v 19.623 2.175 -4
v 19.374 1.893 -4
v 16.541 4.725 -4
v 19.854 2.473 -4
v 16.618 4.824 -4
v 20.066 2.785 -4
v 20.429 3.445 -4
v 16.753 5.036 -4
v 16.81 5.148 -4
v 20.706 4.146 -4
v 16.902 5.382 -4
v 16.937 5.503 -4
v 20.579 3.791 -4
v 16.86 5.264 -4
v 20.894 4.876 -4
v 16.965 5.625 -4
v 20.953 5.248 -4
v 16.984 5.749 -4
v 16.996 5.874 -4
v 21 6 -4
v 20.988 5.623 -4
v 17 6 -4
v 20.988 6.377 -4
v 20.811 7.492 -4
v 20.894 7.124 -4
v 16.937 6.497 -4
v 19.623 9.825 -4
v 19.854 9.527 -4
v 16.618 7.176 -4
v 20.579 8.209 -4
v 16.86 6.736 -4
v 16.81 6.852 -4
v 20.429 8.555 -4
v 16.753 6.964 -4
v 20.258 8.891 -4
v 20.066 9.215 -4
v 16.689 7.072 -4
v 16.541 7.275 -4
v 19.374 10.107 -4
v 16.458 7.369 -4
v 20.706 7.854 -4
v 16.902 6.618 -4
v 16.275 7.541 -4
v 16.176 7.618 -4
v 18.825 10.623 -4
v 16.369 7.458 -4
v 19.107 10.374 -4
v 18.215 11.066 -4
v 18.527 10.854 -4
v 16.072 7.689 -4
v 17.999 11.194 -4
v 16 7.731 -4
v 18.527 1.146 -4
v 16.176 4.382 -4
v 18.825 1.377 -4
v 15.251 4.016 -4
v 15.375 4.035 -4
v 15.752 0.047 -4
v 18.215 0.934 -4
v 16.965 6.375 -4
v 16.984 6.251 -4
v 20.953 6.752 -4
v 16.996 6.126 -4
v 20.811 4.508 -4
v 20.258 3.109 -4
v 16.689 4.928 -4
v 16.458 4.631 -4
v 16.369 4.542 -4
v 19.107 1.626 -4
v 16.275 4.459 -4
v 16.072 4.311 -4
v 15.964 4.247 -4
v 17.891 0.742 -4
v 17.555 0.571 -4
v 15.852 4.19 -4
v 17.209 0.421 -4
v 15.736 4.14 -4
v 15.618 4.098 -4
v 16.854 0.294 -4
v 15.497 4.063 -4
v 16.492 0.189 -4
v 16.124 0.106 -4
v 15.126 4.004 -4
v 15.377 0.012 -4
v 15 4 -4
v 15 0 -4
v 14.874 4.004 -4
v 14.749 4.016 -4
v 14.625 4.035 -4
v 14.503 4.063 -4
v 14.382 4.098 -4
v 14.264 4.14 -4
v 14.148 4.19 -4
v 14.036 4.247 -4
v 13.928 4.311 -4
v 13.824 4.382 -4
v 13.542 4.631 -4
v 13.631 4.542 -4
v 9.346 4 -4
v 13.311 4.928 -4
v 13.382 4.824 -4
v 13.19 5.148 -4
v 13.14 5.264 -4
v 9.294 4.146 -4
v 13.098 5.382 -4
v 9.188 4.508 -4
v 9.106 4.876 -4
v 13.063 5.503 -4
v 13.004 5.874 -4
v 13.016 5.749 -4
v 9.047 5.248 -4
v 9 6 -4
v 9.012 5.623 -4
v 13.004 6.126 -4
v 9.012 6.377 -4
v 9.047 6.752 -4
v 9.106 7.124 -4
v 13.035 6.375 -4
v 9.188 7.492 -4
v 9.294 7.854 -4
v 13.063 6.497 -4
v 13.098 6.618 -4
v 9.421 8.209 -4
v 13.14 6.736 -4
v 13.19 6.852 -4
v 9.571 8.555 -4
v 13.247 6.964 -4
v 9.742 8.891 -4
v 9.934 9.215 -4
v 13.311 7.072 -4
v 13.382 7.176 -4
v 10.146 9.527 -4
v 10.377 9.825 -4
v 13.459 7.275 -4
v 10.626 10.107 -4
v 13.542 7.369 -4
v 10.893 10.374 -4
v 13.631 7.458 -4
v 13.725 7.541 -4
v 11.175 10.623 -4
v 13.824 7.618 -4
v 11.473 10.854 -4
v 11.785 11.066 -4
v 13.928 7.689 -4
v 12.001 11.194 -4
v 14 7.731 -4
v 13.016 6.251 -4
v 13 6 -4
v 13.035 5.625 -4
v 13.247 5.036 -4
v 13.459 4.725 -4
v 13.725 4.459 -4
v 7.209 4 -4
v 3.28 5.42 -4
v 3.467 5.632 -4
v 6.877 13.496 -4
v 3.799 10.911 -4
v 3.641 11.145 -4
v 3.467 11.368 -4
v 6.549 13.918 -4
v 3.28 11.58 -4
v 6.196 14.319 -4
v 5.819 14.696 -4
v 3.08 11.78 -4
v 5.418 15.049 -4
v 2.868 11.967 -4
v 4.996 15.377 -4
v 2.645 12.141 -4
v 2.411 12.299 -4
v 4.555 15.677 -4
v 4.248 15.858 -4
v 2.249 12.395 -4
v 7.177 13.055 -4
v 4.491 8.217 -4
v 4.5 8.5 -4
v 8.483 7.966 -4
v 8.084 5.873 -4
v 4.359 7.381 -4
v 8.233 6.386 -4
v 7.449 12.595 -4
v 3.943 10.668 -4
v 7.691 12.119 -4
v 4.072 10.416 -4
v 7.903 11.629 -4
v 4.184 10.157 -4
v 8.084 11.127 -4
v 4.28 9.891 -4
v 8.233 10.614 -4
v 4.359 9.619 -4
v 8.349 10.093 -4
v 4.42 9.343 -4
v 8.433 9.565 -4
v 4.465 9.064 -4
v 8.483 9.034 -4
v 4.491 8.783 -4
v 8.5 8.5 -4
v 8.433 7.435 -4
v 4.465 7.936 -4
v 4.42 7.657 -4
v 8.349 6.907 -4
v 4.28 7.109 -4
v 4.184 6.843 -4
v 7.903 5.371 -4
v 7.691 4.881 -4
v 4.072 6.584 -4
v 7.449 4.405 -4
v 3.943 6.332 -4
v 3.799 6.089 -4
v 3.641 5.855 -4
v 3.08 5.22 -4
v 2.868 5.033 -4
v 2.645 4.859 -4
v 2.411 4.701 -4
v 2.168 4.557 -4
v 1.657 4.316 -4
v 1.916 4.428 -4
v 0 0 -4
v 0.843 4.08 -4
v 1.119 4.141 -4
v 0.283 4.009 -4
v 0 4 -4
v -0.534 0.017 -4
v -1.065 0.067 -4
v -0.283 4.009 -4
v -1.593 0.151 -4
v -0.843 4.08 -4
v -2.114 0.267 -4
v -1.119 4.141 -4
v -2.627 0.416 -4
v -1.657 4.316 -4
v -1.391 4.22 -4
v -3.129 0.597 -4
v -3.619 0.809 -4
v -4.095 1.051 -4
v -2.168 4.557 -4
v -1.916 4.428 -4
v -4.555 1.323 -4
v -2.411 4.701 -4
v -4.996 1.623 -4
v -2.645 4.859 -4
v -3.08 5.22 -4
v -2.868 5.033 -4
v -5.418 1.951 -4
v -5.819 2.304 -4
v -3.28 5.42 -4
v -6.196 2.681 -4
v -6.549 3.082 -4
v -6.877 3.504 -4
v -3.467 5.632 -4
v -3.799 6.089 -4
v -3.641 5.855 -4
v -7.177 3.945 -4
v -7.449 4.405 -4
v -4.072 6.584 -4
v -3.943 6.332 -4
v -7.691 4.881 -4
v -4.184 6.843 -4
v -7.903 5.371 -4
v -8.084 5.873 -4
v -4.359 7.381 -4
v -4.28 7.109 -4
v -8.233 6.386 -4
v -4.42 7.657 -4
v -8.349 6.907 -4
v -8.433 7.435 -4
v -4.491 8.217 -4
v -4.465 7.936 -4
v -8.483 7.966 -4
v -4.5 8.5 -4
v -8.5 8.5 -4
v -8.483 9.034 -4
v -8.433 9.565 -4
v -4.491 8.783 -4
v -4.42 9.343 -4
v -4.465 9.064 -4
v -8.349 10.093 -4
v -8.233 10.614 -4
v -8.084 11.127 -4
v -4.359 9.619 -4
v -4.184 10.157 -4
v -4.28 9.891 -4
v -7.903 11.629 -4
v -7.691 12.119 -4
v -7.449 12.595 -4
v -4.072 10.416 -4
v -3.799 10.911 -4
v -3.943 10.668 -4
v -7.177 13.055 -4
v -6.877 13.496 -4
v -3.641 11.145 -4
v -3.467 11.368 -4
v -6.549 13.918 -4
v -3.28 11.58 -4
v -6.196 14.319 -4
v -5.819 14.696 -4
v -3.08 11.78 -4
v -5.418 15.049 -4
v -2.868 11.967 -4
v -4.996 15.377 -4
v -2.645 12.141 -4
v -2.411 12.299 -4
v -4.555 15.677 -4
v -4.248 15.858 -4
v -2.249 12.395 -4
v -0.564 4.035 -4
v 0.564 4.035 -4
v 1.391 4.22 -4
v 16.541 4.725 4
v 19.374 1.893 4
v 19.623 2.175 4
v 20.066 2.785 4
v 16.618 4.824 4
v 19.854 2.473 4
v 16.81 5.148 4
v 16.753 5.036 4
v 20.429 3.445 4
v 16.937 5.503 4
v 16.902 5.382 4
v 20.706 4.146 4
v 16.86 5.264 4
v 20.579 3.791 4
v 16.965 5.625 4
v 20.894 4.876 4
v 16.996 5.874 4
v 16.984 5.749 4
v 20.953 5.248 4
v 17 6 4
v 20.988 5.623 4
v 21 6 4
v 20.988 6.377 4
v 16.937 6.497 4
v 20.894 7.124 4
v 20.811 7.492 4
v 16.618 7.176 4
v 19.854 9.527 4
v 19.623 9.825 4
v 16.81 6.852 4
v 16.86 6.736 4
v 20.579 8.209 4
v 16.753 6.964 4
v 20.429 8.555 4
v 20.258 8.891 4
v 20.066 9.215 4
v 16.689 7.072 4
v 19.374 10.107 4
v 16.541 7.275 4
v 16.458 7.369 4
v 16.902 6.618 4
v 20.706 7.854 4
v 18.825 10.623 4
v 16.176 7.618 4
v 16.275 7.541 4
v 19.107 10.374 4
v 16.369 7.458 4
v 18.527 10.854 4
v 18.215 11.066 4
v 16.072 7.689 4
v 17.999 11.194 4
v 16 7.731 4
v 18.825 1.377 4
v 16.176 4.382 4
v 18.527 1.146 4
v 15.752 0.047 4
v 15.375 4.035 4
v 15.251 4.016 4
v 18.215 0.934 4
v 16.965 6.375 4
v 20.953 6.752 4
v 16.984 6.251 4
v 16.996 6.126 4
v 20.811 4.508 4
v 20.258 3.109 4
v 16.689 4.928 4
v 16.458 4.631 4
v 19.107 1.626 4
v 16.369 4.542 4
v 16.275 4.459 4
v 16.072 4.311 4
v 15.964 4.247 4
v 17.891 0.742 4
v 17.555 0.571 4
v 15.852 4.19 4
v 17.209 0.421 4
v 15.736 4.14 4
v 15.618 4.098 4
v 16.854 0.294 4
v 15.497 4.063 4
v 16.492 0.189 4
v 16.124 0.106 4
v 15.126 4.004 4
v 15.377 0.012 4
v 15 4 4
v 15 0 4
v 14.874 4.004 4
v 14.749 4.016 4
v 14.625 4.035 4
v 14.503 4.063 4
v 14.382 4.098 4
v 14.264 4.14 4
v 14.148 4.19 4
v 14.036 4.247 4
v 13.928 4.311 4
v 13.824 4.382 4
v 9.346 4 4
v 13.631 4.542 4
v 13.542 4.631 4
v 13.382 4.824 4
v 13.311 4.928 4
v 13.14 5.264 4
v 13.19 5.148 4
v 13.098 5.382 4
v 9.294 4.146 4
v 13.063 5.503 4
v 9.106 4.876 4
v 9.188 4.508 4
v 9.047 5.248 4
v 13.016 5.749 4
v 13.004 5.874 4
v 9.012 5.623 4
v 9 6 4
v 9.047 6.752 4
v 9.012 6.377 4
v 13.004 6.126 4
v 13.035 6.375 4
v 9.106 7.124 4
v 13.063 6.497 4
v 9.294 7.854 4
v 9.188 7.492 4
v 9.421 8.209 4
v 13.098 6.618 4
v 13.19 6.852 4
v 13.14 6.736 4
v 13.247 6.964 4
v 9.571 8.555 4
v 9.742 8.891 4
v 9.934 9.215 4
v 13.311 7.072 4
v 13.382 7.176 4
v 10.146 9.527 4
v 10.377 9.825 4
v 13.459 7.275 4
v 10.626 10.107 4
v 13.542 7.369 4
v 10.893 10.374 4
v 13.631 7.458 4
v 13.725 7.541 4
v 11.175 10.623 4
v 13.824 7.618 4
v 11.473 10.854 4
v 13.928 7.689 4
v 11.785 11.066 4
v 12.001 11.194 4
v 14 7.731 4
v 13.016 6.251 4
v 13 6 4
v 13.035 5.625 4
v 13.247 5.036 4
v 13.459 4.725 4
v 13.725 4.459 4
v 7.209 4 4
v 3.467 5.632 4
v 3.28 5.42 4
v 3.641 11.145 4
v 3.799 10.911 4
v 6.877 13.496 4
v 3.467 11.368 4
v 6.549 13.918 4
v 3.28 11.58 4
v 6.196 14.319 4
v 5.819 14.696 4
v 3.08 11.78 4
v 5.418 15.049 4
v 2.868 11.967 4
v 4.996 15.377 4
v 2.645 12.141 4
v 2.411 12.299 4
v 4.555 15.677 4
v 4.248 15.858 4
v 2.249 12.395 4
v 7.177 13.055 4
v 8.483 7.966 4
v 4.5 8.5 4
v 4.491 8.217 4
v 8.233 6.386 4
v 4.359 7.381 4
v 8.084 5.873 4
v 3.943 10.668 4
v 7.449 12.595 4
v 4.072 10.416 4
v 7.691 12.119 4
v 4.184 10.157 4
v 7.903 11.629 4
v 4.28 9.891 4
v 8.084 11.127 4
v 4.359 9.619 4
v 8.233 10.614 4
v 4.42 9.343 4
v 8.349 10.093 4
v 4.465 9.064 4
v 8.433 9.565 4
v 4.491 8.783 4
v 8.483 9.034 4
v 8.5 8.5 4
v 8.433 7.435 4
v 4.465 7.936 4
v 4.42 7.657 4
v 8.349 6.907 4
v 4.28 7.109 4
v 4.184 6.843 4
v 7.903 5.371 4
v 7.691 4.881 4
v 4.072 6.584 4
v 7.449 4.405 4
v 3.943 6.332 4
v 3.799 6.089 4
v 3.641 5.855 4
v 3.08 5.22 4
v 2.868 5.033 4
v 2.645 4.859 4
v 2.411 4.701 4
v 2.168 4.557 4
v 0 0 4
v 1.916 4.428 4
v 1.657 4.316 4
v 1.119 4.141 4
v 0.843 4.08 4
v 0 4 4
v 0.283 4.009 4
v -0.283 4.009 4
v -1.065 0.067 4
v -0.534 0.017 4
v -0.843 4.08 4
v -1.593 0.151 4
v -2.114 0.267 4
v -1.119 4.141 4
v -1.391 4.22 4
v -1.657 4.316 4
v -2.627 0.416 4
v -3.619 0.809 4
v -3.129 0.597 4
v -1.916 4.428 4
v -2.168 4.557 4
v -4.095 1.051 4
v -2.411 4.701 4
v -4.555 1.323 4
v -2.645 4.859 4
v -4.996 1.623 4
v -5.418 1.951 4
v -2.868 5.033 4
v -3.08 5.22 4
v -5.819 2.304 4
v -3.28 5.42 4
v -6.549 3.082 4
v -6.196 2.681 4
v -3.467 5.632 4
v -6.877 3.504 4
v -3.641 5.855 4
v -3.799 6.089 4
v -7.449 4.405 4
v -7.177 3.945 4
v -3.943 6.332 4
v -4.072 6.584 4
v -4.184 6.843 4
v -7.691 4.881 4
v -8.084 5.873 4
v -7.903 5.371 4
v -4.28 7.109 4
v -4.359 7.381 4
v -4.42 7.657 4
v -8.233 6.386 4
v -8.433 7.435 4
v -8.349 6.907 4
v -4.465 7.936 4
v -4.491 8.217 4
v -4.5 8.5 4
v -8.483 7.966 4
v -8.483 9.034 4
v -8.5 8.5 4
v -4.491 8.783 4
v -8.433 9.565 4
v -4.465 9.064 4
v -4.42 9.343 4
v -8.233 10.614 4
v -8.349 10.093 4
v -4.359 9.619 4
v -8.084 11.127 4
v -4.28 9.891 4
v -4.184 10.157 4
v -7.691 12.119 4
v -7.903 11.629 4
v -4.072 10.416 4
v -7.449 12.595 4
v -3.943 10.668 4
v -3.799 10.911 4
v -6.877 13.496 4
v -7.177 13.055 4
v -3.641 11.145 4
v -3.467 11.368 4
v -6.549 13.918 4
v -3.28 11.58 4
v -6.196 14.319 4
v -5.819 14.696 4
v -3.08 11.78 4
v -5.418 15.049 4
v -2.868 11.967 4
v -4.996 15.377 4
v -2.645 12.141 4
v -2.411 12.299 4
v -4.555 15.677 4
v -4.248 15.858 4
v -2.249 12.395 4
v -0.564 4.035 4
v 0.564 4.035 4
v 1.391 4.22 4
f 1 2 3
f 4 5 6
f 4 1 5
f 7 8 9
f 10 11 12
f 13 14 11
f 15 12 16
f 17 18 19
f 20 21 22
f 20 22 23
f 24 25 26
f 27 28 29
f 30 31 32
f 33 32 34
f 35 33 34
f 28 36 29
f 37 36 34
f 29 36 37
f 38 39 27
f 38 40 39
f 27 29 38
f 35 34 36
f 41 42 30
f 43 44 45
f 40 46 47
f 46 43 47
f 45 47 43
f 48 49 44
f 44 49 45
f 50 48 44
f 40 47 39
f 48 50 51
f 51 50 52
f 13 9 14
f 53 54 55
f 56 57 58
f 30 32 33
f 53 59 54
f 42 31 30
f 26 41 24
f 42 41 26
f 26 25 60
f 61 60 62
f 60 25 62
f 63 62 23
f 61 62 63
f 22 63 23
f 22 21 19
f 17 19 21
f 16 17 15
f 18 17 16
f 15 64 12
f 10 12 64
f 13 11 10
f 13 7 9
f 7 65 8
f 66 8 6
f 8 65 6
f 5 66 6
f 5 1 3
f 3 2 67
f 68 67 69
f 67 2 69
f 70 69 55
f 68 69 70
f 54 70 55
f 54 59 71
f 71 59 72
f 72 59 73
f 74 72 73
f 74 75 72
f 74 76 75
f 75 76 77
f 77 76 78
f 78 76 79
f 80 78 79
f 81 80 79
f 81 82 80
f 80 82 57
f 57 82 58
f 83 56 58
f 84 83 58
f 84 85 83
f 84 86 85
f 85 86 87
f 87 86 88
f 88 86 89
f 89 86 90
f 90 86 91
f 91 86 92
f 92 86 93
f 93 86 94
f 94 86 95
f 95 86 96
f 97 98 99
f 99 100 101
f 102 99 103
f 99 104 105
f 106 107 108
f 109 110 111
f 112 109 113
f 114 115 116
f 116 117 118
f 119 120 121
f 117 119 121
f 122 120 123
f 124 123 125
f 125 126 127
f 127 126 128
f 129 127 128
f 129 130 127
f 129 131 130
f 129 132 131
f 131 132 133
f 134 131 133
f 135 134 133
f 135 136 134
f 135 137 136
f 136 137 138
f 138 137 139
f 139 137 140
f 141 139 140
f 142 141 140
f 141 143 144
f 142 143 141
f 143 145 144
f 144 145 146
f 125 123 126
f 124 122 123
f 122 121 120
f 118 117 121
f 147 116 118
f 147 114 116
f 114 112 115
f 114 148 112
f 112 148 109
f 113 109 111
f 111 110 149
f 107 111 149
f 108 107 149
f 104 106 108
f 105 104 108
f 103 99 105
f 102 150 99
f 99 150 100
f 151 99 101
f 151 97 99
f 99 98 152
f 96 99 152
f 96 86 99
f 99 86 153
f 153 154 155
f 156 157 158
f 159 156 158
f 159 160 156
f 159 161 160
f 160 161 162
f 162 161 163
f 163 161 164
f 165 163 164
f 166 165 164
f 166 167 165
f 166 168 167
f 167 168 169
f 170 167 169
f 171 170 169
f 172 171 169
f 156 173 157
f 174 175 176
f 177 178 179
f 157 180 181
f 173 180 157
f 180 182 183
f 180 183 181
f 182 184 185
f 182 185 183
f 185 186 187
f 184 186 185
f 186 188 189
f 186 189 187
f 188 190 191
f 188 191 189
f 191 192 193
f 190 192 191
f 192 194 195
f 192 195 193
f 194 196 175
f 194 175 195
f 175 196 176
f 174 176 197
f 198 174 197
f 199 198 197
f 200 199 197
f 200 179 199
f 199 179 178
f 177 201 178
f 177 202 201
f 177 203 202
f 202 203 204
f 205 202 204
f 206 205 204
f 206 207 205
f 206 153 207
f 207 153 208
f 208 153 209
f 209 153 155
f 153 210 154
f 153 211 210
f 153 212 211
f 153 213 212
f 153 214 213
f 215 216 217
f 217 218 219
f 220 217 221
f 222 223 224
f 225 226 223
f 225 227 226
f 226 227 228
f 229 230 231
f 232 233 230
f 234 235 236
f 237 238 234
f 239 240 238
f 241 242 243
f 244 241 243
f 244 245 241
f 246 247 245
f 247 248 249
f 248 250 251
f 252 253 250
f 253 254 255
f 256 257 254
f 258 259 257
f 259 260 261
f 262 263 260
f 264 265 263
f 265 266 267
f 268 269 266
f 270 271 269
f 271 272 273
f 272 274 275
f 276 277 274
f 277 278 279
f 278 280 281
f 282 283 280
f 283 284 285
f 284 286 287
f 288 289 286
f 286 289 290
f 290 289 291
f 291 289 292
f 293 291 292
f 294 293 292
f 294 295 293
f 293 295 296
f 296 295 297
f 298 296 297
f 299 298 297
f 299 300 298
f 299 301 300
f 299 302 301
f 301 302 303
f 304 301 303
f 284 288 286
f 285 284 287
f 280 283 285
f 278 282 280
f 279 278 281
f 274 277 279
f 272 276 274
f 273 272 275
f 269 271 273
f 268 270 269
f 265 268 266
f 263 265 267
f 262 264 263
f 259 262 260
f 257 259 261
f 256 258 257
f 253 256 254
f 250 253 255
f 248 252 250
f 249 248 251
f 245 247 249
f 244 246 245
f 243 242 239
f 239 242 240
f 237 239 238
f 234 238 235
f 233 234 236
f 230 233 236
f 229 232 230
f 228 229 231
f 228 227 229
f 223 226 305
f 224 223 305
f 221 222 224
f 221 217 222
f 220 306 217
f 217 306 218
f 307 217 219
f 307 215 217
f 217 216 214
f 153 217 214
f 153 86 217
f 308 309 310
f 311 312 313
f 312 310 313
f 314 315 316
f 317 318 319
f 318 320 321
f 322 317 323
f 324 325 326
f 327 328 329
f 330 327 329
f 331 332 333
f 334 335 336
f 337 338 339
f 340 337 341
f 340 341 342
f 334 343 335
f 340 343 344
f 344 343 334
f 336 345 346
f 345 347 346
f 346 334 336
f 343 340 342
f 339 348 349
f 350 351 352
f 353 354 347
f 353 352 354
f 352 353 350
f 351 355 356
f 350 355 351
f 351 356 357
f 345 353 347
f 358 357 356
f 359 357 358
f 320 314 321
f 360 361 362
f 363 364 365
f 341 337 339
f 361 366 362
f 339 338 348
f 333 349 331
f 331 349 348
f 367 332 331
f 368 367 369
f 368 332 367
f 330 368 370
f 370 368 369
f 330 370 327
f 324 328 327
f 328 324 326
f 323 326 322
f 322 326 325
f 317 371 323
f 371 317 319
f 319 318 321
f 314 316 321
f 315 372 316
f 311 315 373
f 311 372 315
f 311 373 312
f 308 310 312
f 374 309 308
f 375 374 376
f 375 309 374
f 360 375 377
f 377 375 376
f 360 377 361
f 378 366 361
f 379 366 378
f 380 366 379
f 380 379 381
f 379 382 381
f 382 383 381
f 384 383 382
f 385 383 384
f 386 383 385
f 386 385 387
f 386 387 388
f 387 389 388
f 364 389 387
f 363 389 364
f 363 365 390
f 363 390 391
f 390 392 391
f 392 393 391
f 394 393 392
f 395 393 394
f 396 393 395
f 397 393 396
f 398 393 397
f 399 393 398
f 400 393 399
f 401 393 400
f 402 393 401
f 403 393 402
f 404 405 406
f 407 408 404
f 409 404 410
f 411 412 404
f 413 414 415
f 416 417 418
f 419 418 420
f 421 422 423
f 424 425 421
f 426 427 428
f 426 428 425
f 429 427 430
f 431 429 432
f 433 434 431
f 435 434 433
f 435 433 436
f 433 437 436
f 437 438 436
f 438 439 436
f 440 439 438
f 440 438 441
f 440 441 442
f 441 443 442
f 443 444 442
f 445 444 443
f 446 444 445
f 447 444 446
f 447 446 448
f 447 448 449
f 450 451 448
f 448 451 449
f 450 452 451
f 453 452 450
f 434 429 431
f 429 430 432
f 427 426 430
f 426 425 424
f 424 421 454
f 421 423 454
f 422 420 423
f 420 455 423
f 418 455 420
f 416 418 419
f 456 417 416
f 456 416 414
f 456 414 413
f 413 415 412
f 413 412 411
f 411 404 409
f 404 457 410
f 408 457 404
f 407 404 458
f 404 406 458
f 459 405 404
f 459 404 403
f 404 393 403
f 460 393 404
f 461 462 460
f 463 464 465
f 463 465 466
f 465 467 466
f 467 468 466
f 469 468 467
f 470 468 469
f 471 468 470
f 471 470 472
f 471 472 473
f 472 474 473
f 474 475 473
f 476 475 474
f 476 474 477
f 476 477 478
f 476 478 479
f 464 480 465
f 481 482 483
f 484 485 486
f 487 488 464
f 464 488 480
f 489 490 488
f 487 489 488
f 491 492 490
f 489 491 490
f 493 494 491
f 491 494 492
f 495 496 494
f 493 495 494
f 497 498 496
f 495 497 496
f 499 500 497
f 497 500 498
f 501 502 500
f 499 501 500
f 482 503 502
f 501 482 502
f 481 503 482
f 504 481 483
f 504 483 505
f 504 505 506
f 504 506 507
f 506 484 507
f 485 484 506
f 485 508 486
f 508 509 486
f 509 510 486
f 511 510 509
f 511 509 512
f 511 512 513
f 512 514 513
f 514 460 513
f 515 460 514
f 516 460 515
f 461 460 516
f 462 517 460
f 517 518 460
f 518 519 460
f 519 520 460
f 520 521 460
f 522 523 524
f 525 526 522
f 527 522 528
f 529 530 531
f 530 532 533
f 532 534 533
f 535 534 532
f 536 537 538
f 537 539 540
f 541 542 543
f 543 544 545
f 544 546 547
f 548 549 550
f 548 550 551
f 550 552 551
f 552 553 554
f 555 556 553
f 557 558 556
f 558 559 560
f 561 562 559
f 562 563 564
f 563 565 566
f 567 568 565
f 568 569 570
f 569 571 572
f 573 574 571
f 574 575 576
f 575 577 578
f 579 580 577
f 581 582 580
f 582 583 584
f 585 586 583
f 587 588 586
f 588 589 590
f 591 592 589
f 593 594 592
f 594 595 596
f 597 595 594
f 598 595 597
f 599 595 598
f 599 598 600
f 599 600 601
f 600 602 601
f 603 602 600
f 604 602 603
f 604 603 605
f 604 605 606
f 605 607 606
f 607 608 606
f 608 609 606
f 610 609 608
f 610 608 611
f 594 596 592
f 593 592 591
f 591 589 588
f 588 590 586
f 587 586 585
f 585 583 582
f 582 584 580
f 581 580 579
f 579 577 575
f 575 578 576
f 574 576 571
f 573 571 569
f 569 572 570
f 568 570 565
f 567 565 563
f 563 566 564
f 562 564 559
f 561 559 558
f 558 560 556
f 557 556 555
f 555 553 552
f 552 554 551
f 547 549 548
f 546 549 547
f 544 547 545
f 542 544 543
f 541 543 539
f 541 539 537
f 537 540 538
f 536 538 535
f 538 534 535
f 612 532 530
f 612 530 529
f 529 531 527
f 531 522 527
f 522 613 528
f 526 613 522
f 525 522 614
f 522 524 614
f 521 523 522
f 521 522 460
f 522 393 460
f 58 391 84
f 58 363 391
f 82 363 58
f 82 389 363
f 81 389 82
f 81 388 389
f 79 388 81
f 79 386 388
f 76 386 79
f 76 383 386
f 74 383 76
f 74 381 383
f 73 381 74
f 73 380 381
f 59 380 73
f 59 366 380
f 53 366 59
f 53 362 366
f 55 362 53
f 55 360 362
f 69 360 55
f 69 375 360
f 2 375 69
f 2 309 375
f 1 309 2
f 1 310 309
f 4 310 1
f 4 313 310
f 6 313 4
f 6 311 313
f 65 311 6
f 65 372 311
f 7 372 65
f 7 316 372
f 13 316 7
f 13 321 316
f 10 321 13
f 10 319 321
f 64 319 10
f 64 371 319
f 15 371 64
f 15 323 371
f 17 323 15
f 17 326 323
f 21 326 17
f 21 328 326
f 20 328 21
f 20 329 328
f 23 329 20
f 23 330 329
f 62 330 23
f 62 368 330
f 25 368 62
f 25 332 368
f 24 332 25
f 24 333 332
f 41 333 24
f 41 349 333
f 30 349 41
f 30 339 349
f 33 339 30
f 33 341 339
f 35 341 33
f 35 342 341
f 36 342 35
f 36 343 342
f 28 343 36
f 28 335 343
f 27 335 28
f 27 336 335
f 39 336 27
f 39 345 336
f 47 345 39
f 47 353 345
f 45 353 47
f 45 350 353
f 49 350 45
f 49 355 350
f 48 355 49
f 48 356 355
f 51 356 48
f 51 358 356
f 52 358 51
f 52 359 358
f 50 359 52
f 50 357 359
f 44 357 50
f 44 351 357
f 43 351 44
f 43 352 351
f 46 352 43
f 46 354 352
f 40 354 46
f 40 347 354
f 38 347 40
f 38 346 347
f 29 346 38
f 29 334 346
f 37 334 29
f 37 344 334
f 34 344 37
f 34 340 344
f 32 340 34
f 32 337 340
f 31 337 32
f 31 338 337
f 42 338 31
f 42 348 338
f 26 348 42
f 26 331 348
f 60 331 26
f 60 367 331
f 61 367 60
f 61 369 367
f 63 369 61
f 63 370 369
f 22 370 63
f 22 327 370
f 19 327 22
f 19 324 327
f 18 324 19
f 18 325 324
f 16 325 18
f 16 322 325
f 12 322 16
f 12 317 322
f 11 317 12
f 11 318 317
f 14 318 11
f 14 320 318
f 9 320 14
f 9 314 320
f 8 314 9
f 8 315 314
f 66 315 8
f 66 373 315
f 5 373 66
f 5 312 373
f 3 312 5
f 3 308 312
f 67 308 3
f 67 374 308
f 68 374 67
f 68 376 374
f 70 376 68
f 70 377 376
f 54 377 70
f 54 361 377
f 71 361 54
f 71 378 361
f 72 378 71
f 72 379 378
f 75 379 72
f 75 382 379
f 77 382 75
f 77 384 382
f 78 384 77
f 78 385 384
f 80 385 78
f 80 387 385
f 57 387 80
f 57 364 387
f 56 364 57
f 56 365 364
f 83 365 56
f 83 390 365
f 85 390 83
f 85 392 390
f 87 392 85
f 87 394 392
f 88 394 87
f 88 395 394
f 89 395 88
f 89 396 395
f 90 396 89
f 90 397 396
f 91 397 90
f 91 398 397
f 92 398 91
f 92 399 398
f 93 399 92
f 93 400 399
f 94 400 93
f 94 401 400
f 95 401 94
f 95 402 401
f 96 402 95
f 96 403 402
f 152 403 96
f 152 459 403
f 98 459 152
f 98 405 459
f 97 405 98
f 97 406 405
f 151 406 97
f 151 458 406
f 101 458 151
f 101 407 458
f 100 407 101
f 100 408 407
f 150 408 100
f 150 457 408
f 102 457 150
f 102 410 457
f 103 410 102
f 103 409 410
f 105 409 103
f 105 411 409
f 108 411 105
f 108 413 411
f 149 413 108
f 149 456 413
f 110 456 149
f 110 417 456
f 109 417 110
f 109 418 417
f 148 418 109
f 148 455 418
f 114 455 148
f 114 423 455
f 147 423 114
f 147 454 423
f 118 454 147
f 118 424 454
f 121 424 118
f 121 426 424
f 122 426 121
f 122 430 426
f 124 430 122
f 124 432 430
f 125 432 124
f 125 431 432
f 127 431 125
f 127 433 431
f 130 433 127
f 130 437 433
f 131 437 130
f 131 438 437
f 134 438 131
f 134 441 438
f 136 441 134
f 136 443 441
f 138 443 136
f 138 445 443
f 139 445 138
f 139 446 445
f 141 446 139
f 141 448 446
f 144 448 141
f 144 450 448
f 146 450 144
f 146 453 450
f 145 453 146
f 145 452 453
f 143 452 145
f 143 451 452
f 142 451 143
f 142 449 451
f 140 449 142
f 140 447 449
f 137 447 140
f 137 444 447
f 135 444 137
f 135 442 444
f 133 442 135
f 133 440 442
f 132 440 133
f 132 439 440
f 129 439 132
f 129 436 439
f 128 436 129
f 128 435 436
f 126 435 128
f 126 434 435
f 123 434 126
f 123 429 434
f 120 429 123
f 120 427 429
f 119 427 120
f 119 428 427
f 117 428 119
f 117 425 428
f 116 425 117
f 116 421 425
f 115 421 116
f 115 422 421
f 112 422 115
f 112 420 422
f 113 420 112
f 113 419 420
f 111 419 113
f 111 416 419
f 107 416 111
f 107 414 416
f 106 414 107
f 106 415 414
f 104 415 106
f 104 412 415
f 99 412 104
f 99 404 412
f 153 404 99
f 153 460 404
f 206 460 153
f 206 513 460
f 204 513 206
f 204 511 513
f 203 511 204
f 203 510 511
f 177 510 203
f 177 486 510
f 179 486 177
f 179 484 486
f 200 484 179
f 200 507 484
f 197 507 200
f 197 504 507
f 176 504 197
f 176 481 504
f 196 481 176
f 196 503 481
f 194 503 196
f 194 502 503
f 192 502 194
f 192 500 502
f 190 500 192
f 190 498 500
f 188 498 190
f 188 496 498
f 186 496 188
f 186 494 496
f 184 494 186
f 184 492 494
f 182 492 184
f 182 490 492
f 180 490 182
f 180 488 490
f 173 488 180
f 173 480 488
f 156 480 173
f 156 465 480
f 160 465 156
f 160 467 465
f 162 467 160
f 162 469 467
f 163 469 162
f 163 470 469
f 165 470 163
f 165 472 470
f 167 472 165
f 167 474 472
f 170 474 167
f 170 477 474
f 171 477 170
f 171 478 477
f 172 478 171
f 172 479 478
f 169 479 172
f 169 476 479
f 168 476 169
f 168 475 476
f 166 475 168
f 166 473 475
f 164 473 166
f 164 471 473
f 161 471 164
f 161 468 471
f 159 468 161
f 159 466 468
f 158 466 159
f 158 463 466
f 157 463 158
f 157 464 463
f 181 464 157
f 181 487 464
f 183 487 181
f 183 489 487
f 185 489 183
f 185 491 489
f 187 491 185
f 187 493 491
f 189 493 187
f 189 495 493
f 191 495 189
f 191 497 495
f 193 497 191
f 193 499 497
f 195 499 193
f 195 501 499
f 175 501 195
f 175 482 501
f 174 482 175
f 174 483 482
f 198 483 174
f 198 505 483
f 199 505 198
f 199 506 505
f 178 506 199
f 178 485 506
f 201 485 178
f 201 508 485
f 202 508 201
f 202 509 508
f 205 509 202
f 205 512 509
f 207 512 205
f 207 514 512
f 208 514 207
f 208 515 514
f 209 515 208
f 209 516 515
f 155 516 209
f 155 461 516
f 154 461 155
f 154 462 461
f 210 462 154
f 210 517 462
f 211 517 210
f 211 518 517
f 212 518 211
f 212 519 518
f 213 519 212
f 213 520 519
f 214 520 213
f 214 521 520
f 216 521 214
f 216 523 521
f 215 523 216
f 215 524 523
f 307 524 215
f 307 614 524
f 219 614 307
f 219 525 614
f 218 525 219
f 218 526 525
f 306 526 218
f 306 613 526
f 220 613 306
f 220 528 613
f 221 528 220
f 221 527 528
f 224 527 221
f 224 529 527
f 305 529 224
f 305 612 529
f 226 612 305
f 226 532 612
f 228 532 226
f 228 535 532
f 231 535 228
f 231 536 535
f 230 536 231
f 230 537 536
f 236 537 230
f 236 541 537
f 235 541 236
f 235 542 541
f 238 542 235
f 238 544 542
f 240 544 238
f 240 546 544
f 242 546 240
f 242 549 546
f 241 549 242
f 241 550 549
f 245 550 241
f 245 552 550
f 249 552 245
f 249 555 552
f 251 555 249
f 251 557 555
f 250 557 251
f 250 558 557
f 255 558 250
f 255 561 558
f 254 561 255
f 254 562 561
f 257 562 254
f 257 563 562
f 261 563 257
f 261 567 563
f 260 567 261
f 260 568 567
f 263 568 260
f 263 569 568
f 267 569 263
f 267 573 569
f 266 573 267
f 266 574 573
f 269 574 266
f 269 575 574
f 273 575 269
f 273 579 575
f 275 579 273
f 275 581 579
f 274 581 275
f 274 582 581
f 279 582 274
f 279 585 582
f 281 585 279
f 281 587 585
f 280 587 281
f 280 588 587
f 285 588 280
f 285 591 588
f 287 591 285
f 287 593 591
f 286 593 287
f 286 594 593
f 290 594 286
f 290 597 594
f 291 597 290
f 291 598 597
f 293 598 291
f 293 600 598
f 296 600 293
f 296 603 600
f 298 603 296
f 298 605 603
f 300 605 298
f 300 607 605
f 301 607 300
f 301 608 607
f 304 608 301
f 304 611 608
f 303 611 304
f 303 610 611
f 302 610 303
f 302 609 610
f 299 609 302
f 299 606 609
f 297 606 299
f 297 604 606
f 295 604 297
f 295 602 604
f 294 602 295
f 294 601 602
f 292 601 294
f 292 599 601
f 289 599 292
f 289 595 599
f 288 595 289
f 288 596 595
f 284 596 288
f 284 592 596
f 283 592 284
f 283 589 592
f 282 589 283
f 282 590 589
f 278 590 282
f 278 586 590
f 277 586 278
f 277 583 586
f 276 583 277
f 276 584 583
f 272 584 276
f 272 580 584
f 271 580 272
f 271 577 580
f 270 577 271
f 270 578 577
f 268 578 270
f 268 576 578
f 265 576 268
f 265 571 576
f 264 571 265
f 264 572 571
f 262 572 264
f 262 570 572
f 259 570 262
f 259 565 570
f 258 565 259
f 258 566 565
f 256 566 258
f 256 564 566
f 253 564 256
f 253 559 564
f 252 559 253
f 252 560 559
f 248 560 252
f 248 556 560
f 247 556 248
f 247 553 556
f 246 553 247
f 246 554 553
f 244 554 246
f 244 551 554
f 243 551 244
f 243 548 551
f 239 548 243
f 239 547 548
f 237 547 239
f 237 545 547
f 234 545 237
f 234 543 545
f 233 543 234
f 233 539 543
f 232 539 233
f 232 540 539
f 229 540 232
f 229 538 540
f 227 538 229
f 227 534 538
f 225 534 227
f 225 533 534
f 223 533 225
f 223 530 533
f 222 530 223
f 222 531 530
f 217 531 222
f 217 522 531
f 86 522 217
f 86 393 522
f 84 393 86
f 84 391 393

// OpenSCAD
/************** BEST VIEWED IN A CODE EDITOR 80 COLUMNS WIDE *******************
*
* Customizable Fishing Rod Clips
* Benjamen Johnson <workshop.electronsmith.com>
* 20180613
* Version 5
* openSCAD Version: 2015.03-2
*******************************************************************************/

// Diameter of the bottom section
inner_dia_1 =9;

// Diameter of the top section
inner_dia_2 = 4;

// Wedge angle of the cut (how many degrees of the circle to cut)
wedge_angle = 60;

// Thickness of the clip
wall_thickness = 4;

// Distance between the sections
distance = 15;

// Height of the clip
height = 8;

// how round? The higher the rounder
facets=100;

// calculate the outer diameters
outer_dia_1 = inner_dia_1+2*wall_thickness;
outer_dia_2 = inner_dia_2+2*wall_thickness;

linear_extrude(height, convexity=10, twist=0,center=true)
union() {
// move so the outer wall of the bottom clip lines up with the X-axis    
translate([0,outer_dia_1/2,0]) difference() {
    circle(d=outer_dia_1, center=true,$fn=facets);
    circle(d=inner_dia_1, center=true,$fn=facets);
    rotate([0,0,90]) wedge(outer_dia_1*2,wedge_angle);

}
// move so the outer wall of the top clip lines up with the X-axis    
translate([0,outer_dia_2/2,0]) difference() {
    translate([distance,0,0])circle(d=outer_dia_2, center=true,$fn=facets);  
    translate([distance,0,0])circle(d=inner_dia_2, center=true,$fn=facets);
    translate([distance,0,0])rotate([0,0,90]) wedge(outer_dia_2*2,wedge_angle);

}
// join the two clips
translate([distance/2,wall_thickness/2])square([distance,wall_thickness],center=true);
}

module wedge(x=1,angle=45){
    angle=angle/2; 
    
        polygon([[0,0],
              [x*cos(angle),x*sin(angle)],
              [x*cos(angle),-x*sin(angle)]]);
        
    }
